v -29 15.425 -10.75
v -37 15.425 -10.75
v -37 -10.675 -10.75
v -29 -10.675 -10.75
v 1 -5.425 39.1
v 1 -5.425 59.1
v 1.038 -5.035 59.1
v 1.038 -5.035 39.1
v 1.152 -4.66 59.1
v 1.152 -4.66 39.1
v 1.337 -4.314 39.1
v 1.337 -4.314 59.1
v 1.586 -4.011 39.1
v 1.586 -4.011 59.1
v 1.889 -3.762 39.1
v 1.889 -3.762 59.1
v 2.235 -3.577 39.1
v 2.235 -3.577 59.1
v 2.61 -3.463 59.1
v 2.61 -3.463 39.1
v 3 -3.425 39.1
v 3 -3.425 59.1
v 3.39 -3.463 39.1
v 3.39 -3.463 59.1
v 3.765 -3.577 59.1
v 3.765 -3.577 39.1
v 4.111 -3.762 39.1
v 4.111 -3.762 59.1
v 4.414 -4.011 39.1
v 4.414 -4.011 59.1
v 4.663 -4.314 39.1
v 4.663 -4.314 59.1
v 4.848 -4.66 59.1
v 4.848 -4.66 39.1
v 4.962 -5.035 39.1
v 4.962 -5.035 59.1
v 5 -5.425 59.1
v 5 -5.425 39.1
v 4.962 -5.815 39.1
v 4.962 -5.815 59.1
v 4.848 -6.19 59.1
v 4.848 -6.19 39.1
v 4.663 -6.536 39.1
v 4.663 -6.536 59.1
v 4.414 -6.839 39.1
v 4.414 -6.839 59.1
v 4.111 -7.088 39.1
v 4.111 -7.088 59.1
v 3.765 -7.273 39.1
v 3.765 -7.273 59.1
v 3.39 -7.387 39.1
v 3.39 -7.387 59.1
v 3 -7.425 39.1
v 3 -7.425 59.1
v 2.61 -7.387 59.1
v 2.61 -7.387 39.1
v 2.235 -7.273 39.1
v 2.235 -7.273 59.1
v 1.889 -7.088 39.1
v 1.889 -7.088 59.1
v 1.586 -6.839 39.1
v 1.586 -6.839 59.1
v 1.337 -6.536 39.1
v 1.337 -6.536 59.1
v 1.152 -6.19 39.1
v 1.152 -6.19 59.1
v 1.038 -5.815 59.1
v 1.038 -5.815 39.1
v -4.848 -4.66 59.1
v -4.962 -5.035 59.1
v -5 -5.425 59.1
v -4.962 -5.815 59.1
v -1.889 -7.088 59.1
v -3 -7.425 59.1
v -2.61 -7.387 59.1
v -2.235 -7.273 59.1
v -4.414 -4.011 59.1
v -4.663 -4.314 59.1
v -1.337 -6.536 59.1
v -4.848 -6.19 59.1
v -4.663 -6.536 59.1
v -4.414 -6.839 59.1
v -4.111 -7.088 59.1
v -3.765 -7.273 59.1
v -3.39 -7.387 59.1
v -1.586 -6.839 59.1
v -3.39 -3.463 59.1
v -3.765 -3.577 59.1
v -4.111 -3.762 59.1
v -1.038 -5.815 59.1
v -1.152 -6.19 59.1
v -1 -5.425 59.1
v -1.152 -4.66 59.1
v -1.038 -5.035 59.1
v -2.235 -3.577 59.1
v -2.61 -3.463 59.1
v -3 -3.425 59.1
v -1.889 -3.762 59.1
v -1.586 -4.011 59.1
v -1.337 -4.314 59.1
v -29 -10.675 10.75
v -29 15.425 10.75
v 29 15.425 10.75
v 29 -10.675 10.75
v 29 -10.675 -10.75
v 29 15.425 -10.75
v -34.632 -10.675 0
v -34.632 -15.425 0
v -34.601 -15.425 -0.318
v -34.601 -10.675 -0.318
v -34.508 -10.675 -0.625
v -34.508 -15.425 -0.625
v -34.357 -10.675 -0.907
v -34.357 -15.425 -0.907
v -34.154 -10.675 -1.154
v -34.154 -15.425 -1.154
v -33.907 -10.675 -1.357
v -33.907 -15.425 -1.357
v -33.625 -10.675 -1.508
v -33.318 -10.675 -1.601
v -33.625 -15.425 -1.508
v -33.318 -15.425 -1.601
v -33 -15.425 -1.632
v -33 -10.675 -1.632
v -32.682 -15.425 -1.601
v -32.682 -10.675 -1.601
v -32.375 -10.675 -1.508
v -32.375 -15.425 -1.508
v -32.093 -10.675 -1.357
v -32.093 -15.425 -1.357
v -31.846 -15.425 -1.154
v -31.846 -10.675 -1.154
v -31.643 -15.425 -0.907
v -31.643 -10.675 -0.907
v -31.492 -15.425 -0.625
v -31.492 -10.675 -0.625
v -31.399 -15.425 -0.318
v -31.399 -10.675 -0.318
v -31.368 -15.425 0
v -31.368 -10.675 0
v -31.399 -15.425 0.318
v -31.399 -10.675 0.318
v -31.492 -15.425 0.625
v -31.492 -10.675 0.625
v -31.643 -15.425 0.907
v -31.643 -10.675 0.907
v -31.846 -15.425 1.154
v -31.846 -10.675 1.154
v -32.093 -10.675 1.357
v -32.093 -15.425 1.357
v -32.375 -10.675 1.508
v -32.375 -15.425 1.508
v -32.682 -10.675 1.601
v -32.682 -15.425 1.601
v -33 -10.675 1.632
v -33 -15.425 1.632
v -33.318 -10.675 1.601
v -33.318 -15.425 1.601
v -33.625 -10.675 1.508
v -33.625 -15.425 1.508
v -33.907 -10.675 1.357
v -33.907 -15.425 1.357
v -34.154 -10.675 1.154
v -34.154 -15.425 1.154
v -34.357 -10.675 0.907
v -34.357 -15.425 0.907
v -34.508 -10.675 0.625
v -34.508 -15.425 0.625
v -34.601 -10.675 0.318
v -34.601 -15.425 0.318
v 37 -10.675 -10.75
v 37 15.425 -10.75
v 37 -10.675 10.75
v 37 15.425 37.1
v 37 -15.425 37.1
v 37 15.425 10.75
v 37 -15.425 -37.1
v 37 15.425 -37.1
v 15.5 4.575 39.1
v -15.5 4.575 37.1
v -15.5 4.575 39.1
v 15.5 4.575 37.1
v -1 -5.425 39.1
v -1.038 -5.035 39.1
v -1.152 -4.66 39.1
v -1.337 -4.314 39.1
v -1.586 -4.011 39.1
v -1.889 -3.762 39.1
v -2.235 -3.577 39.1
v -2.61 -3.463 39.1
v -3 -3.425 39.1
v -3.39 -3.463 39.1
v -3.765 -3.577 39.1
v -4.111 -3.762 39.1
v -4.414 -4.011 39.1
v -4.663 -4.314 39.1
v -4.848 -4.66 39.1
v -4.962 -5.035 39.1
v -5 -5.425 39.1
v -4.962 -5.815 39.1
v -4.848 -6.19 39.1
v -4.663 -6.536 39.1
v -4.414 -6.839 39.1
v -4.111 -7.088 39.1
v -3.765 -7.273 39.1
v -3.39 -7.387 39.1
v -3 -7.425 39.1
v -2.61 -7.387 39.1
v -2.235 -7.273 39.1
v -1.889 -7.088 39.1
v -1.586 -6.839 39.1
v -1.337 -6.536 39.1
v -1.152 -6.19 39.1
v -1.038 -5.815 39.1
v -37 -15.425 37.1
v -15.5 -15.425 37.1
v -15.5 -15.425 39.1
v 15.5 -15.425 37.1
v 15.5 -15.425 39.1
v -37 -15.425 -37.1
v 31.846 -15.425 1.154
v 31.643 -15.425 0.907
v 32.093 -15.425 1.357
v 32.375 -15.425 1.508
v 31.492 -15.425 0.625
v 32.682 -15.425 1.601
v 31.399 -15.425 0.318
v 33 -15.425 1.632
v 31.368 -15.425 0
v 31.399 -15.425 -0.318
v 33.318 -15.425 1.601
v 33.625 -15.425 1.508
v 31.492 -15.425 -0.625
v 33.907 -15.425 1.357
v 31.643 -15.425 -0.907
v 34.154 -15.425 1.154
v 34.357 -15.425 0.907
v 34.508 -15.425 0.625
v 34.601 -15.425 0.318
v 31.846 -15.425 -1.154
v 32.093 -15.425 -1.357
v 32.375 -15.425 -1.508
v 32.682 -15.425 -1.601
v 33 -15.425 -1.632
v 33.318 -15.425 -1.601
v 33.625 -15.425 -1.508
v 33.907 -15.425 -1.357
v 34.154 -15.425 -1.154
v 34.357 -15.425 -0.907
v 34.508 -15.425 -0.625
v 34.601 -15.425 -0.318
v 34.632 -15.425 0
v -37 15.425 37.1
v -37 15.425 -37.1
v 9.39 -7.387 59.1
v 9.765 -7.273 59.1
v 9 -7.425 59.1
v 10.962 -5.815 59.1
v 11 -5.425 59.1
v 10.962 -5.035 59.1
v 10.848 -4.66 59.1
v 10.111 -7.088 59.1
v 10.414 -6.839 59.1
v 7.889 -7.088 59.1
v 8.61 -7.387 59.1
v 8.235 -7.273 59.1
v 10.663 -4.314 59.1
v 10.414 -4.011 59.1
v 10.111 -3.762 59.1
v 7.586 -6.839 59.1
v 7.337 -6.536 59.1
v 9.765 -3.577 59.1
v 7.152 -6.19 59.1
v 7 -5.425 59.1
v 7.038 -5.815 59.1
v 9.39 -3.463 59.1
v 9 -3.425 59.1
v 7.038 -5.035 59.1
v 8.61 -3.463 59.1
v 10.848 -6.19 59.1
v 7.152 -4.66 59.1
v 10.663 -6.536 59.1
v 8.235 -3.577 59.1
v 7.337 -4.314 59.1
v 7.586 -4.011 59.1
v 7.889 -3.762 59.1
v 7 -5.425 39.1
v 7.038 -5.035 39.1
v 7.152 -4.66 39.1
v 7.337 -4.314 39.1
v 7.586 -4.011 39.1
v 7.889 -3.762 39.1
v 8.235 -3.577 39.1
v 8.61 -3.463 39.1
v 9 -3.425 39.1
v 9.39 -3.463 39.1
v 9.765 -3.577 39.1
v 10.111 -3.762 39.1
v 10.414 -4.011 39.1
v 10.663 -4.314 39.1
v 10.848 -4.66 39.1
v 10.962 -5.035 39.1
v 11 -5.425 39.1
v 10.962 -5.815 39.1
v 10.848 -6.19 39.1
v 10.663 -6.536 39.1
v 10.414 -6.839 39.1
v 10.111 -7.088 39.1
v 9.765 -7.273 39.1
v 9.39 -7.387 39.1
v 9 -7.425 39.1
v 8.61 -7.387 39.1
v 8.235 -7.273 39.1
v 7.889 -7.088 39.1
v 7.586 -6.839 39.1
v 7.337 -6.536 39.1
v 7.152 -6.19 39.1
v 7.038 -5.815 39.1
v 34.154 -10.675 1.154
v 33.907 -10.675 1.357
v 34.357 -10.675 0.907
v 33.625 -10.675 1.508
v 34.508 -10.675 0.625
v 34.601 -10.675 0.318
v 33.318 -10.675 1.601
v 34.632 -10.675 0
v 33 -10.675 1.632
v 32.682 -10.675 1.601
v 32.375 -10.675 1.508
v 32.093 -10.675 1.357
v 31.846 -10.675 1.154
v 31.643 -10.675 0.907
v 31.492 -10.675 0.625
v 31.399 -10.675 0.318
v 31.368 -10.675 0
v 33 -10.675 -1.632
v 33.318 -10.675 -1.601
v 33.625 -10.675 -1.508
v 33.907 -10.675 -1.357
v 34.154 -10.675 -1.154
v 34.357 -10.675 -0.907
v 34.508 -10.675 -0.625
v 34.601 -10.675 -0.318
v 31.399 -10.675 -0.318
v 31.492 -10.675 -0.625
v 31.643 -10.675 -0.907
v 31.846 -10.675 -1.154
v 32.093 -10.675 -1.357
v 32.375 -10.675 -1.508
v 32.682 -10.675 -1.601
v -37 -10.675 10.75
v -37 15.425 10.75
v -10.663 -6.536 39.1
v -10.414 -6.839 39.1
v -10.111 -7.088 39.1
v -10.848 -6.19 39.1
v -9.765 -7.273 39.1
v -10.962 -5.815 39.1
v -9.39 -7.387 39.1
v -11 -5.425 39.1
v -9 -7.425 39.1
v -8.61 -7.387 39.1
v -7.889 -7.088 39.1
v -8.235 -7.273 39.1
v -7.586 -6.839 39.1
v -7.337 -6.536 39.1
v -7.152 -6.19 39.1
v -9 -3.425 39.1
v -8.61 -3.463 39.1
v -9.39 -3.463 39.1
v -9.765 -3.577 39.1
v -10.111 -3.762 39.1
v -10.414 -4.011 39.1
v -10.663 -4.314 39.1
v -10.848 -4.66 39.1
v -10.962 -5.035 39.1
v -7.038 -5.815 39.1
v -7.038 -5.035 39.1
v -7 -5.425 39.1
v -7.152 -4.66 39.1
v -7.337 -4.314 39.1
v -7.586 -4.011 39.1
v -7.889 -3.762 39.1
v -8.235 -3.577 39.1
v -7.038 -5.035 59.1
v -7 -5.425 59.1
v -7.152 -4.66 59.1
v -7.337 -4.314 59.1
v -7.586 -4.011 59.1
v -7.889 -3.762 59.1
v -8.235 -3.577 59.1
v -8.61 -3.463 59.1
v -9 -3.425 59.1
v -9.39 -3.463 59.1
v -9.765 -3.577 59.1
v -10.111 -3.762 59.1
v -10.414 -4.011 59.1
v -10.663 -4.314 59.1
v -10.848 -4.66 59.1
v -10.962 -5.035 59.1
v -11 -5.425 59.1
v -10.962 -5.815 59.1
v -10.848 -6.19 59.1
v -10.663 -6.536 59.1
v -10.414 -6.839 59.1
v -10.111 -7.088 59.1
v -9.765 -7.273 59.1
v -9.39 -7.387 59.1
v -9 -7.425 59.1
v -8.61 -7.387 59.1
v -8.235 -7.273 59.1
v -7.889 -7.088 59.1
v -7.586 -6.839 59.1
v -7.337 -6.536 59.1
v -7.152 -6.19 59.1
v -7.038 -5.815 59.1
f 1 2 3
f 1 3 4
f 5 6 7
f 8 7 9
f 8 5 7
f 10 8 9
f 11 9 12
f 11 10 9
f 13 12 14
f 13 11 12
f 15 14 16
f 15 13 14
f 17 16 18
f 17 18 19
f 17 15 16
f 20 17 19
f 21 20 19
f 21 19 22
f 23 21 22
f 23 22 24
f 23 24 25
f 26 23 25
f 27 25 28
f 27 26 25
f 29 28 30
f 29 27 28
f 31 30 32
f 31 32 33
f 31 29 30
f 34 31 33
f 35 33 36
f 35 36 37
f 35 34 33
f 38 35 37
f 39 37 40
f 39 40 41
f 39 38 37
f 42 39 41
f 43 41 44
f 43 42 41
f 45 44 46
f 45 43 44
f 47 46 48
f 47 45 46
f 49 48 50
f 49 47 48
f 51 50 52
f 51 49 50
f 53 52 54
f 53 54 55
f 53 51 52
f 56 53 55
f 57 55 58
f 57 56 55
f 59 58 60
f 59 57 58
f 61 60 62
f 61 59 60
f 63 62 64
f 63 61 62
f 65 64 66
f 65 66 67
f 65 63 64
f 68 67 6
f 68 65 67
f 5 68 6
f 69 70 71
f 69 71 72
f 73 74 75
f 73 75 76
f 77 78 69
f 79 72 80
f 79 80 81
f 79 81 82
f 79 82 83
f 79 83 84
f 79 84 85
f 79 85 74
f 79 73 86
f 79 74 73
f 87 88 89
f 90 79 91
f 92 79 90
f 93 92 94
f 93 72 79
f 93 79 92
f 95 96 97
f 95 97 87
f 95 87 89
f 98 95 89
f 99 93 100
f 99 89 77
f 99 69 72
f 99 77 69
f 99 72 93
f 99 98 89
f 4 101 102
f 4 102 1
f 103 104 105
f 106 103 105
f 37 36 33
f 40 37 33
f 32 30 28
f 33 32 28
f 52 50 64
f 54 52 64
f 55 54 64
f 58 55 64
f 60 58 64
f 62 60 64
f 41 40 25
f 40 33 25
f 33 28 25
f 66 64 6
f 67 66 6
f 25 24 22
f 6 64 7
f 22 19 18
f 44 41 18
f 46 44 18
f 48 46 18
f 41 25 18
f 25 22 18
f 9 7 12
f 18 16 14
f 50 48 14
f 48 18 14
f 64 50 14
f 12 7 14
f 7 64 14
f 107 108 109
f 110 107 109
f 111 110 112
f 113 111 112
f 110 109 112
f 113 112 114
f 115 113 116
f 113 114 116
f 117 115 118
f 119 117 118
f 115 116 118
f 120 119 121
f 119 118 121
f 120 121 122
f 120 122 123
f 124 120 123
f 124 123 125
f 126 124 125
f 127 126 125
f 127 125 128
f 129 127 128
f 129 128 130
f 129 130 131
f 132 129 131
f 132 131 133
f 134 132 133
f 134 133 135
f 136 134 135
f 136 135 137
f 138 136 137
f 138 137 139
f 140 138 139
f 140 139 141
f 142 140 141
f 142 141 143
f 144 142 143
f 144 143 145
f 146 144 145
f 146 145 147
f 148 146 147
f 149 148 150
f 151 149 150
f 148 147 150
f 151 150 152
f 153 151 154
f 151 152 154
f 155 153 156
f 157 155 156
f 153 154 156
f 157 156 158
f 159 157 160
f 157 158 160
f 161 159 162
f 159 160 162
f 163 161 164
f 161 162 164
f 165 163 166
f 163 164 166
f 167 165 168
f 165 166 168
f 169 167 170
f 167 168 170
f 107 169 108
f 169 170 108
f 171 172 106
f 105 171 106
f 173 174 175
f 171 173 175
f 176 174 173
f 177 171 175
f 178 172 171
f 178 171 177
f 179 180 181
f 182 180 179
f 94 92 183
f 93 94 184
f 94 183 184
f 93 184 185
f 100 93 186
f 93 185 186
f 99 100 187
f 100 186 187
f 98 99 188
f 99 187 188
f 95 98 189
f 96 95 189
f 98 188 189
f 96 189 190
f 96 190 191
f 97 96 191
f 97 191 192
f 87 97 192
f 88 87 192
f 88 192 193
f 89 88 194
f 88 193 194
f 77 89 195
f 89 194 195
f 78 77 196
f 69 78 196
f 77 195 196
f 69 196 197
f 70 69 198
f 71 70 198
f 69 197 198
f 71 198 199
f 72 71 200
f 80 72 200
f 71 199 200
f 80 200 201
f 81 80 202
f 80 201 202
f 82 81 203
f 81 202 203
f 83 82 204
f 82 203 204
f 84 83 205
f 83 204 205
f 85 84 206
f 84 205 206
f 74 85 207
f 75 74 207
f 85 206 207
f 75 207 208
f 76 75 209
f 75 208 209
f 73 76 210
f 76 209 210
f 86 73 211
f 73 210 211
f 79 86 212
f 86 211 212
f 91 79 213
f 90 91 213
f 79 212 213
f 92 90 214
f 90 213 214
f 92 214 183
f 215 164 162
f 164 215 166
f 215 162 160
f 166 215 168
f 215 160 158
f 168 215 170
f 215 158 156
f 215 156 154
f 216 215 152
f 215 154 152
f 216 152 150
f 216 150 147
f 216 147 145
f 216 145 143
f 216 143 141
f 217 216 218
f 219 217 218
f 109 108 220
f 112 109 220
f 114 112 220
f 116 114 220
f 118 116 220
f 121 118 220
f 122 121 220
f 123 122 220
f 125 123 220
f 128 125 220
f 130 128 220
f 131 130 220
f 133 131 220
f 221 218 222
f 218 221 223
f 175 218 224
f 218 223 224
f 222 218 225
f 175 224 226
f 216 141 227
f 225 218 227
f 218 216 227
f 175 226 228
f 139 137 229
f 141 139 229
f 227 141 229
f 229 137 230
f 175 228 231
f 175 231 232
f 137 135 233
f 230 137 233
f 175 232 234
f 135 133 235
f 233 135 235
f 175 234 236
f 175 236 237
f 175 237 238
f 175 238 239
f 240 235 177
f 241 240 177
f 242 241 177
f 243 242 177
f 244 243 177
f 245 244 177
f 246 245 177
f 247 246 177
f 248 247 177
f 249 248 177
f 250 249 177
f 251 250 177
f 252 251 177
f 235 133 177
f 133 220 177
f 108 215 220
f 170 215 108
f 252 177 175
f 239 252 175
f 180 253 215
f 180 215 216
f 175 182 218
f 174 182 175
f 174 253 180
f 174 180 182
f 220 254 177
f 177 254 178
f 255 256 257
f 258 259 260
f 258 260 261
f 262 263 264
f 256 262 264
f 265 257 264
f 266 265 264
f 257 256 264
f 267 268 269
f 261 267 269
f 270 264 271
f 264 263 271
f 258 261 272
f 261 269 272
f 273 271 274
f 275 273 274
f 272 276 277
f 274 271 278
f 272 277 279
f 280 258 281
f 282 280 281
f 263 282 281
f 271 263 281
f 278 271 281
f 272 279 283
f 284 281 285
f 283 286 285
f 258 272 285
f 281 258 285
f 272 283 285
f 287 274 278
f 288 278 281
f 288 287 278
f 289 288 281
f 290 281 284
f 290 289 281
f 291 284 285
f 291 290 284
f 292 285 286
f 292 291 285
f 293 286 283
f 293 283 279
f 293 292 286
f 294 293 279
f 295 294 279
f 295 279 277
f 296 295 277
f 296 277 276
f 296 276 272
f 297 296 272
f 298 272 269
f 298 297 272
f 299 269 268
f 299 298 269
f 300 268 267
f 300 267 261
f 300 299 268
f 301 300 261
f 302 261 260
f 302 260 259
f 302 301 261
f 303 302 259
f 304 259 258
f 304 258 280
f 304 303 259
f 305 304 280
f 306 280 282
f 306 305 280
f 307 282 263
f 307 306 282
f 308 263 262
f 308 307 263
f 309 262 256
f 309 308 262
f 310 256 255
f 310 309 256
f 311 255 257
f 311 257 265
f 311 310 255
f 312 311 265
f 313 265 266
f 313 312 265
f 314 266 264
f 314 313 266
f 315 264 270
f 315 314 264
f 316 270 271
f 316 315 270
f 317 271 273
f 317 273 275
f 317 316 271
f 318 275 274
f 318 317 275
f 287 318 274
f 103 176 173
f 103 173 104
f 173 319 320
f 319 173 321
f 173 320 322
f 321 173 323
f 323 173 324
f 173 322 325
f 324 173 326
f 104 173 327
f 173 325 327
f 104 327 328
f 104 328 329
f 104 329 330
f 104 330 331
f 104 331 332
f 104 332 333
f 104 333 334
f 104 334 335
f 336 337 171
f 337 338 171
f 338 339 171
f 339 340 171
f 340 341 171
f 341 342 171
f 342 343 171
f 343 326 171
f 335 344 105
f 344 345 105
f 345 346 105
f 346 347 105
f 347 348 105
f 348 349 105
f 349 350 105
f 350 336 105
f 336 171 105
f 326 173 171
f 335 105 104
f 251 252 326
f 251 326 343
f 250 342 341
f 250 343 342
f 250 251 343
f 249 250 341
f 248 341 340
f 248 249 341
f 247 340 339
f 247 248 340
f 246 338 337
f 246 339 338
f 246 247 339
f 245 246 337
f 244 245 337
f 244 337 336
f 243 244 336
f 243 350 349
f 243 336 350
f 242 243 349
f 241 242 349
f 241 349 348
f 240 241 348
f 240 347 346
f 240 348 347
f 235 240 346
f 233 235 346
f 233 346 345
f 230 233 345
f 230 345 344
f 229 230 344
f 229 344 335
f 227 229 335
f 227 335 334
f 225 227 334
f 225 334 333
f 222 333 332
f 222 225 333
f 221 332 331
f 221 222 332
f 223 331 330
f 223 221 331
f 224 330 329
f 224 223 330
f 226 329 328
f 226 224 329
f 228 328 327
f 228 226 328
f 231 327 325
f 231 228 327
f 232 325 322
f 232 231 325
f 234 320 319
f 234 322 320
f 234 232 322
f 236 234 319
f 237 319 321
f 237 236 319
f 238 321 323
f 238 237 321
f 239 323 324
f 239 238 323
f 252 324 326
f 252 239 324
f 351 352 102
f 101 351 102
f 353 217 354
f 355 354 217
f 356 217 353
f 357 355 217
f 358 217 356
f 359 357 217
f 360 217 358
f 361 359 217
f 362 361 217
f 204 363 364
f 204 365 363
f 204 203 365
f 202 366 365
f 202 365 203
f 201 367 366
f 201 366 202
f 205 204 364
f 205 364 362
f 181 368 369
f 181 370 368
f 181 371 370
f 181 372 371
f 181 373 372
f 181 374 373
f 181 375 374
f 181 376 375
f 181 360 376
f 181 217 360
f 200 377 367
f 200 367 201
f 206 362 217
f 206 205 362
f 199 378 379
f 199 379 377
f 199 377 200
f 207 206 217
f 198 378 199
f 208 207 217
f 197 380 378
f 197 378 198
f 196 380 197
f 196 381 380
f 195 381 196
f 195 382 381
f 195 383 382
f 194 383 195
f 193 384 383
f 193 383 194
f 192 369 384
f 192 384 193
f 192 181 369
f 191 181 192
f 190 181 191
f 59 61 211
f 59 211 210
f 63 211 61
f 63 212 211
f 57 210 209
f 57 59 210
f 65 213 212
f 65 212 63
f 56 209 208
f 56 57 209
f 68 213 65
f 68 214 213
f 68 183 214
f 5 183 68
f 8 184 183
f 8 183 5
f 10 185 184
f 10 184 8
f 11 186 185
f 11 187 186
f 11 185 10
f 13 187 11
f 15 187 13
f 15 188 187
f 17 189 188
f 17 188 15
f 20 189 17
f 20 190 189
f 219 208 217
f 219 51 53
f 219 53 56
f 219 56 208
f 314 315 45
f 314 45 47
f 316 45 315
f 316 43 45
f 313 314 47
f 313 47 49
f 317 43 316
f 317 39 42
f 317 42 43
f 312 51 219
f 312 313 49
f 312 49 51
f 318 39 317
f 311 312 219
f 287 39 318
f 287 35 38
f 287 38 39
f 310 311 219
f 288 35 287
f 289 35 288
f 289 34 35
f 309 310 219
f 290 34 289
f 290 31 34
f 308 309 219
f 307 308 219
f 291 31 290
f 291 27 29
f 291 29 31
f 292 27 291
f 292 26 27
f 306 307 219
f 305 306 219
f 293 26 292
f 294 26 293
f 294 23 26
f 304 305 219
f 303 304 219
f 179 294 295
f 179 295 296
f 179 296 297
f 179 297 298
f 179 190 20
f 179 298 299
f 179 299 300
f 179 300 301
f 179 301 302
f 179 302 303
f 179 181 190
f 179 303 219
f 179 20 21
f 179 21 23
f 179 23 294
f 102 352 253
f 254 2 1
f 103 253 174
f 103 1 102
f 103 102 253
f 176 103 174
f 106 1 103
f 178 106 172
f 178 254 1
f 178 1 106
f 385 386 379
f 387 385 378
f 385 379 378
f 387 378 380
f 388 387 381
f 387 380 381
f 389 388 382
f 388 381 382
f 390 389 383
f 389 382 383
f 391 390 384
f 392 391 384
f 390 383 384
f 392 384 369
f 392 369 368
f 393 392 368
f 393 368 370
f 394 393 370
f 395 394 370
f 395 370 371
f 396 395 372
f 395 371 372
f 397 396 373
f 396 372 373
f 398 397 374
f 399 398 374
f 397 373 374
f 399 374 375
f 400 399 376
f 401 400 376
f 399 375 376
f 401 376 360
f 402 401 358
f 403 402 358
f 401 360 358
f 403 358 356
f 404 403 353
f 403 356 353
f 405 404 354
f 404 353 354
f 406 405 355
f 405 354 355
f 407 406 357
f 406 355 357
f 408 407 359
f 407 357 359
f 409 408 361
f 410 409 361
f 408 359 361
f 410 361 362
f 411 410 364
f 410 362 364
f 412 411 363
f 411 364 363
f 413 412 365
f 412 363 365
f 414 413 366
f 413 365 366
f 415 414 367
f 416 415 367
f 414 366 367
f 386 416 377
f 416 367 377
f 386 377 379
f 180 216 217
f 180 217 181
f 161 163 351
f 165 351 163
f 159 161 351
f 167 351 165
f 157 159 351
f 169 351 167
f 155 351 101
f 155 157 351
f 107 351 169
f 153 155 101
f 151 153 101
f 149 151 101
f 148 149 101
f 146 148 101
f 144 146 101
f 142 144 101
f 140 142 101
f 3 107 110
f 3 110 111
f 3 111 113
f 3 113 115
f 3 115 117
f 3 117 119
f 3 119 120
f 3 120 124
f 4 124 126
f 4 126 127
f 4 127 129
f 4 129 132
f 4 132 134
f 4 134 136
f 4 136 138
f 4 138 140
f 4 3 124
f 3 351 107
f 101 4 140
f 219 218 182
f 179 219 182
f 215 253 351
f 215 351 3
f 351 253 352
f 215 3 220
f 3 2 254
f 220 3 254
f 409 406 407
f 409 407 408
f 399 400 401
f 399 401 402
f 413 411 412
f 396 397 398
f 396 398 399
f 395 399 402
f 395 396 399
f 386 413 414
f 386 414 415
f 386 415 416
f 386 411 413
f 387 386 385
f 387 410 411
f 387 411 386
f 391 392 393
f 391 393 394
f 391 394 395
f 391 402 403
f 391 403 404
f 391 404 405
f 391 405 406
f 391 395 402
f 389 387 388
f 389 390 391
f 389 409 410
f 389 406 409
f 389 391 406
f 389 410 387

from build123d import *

# Parameters (mm, degrees)
SKETCH1_W                    = 74
SKETCH1_H                    = 74.2
BOSS_EXTRUDE1_DEPTH          = 15.425
SKETCH3_W                    = 8
SKETCH3_H                    = 21.5
CUT_EXTRUDE1_DEPTH           = 26.1
F_30_0_1285_DIAMETER_HOLE1_D = 3.2639
SKETCH6_W                    = 31
SKETCH6_H                    = 20
BOSS_EXTRUDE2_DEPTH          = 2
SKETCH7_R                    = 2
BOSS_EXTRUDE3_DEPTH          = 20


with BuildPart() as part:
    # Sketch1 → Boss-Extrude1 (new, symmetric)
    with BuildSketch(Plane(origin=(0, 0, 0), x_dir=(1, 0, 0), z_dir=(0, 1, 0))):
        Rectangle(SKETCH1_W, SKETCH1_H)
    extrude(amount=BOSS_EXTRUDE1_DEPTH, both=True)

    # Sketch3 → Cut-Extrude1 (cut)
    with BuildSketch(Plane(origin=(0, 15.425, 0), x_dir=(1, 0, 0), z_dir=(0, 1, 0))):
        with Locations((-33, 0)):
            Rectangle(SKETCH3_W, SKETCH3_H)
    cut_extrude1 = extrude(amount=-CUT_EXTRUDE1_DEPTH, mode=Mode.SUBTRACT)

    # #30 (0.1285) Diameter Hole1 (through all)
    with Locations(Plane(origin=(0, -10.675, 0), x_dir=(1, 0, 0), z_dir=(0, 1, 0))):
        with Locations((-33, 0)):
            f_30_0_1285_diameter_hole1 = Hole(F_30_0_1285_DIAMETER_HOLE1_D / 2)

    # Sketch6 → Boss-Extrude2 (add)
    with BuildSketch(Plane.XY.offset(37.1)):
        with Locations((0, -5.425)):
            Rectangle(SKETCH6_W, SKETCH6_H)
    extrude(amount=BOSS_EXTRUDE2_DEPTH)

    # Sketch7 → Boss-Extrude3 (add)
    with BuildSketch(Plane.XY.offset(39.1)):
        with Locations((-9, -5.425)):
            Circle(SKETCH7_R)
        with Locations((-3, -5.425)):
            Circle(SKETCH7_R)
    boss_extrude3 = extrude(amount=BOSS_EXTRUDE3_DEPTH)

    # Mirror1: Cut-Extrude1, #30 (0.1285) Diameter Hole1, Boss-Extrude3 across plane
    add(cut_extrude1.mirror(Plane(origin=(0, 0, 0), x_dir=(0, 0, 1), z_dir=(1, 0, 0))), mode=Mode.SUBTRACT)
    add(f_30_0_1285_diameter_hole1.mirror(Plane(origin=(0, 0, 0), x_dir=(0, 0, 1), z_dir=(1, 0, 0))), mode=Mode.SUBTRACT)
    add(boss_extrude3.mirror(Plane(origin=(0, 0, 0), x_dir=(0, 0, 1), z_dir=(1, 0, 0))))


solid = part.part
